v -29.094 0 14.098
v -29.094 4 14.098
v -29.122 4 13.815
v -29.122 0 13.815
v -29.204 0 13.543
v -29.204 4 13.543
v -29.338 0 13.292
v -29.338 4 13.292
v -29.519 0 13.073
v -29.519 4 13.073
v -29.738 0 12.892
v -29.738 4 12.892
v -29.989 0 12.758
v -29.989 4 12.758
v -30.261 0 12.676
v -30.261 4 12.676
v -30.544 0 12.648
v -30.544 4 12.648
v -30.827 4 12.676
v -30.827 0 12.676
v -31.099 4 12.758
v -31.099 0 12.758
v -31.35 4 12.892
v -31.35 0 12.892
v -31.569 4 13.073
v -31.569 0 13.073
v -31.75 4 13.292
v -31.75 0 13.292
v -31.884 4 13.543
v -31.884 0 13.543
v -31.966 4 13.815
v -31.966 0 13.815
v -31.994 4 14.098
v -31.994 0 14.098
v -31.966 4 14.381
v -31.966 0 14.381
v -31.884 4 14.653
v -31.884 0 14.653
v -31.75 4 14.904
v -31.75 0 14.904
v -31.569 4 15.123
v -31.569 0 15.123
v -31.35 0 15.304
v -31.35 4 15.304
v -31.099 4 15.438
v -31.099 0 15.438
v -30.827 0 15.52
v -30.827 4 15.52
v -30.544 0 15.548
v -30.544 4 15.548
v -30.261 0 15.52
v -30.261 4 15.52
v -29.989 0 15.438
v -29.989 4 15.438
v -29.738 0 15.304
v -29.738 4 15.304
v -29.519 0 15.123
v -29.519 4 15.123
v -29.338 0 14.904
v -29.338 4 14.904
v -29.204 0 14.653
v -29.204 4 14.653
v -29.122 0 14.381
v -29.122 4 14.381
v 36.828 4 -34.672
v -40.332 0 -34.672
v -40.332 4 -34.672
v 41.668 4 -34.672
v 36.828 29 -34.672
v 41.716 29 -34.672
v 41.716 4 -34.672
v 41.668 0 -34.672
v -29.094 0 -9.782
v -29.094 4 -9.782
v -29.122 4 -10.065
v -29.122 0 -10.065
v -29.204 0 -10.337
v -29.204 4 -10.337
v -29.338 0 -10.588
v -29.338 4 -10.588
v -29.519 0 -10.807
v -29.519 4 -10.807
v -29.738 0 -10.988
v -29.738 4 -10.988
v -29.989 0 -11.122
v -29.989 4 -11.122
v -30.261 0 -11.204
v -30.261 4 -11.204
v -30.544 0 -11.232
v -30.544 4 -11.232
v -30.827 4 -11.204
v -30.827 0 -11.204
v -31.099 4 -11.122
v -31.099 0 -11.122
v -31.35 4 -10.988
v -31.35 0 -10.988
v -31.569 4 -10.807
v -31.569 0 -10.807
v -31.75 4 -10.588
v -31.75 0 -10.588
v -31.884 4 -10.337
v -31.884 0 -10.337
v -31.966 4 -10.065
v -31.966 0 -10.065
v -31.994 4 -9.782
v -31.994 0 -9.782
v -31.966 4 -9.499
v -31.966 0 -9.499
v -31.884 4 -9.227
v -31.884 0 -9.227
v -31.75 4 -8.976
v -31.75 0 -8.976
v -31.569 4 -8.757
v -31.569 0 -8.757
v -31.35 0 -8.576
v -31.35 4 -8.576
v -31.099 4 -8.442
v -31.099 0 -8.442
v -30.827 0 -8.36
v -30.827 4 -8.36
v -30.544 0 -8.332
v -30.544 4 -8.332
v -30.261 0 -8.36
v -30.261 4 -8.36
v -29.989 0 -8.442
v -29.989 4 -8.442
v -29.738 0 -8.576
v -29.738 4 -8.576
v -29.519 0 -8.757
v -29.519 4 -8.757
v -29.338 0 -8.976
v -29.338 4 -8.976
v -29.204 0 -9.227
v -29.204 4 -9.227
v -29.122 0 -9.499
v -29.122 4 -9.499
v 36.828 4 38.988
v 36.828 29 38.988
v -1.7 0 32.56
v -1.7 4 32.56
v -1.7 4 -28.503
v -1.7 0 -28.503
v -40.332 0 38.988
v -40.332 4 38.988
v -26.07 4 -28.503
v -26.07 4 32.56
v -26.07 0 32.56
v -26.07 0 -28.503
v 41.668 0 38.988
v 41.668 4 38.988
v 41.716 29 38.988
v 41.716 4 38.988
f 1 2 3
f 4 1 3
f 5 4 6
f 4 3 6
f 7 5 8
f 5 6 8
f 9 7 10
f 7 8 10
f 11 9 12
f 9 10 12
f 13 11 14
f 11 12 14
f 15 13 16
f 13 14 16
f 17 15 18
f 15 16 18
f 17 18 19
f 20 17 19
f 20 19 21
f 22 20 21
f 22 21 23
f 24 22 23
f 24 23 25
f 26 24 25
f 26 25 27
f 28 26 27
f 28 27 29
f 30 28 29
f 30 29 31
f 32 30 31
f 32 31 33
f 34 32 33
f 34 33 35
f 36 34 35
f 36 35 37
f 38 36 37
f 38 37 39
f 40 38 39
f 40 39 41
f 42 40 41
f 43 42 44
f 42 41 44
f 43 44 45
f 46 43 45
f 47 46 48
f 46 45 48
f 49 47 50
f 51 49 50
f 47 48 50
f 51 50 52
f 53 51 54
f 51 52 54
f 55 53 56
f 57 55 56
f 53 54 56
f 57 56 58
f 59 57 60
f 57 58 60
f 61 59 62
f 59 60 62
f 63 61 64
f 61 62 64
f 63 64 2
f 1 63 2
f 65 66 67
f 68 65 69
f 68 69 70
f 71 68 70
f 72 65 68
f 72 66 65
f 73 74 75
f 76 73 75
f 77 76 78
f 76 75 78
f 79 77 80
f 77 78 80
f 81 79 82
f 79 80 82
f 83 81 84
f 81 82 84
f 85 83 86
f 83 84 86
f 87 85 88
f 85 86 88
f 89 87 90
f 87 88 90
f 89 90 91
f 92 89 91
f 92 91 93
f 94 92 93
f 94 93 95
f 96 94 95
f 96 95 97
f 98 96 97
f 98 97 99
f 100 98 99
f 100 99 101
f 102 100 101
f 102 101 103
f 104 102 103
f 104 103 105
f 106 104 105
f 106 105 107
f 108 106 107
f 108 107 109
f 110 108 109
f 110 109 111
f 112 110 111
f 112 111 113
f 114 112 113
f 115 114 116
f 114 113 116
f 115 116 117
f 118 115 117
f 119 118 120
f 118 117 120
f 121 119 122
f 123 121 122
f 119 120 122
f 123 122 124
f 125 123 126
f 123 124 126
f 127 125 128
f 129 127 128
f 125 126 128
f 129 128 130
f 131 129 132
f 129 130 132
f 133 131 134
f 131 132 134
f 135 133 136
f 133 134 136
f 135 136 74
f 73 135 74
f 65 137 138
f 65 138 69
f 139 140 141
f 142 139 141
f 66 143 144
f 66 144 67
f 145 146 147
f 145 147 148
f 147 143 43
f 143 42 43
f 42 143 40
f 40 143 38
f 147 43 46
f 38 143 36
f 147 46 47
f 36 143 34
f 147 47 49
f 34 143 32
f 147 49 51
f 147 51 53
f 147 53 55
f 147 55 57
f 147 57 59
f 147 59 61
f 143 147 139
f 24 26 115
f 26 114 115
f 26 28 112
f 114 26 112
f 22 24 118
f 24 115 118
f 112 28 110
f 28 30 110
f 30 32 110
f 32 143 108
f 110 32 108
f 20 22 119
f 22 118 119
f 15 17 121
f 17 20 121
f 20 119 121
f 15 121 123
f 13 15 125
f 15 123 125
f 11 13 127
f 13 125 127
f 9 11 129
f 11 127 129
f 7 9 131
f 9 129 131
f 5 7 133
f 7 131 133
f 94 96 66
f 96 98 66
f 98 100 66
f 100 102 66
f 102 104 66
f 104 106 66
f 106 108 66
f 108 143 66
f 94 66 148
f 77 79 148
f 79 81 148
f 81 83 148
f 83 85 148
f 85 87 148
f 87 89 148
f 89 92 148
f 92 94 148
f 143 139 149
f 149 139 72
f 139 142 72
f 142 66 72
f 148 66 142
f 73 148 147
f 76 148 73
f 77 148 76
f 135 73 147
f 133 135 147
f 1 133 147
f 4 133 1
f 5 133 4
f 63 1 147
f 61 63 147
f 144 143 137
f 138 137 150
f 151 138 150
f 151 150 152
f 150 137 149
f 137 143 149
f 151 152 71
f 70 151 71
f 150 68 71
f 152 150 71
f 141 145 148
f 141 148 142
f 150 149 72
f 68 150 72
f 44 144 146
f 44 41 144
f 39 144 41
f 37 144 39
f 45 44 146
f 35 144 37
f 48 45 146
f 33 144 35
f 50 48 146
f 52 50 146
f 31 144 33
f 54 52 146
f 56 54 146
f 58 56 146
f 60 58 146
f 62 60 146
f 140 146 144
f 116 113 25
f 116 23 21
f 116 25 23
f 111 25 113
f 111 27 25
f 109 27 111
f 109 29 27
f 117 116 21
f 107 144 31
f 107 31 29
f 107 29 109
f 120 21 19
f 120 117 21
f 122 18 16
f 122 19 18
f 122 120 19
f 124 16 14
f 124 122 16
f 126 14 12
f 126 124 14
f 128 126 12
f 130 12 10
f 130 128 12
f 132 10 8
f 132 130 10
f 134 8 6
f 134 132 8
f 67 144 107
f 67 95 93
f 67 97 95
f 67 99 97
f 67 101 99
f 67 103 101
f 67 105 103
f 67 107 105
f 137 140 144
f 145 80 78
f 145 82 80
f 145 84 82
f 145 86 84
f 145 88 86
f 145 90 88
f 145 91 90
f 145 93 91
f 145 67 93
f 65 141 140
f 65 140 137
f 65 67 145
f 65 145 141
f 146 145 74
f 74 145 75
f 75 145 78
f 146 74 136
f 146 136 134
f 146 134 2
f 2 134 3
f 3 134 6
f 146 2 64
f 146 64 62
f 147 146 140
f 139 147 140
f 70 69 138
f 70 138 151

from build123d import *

# Parameters (mm, degrees)
SKETCH1_W           = 82
SKETCH1_H           = 73.66
BOSS_EXTRUDE1_DEPTH = 4
SKETCH2_W           = 4.88717895
SKETCH2_H           = 73.66
BOSS_EXTRUDE2_DEPTH = 25
SKETCH3_R           = 1.45
CUT_EXTRUDE1_DEPTH  = 10
SKETCH4_W           = 24.37
SKETCH4_H           = 61.062715067
CUT_EXTRUDE2_DEPTH  = 10


with BuildPart() as part:
    # Sketch1 → Boss-Extrude1 (new body)
    with BuildSketch(Plane(origin=(0, 0, 0), x_dir=(1, 0, 0), z_dir=(0, 1, 0))):
        with Locations((0.667646454, -2.157941762)):
            Rectangle(SKETCH1_W, SKETCH1_H)
    extrude(amount=BOSS_EXTRUDE1_DEPTH)

    # Sketch2 → Boss-Extrude2 (add)
    with BuildSketch(Plane(origin=(0, 4, 0), x_dir=(1, 0, 0), z_dir=(0, 1, 0))):
        with Locations((39.271911138, -2.157941762)):
            Rectangle(SKETCH2_W, SKETCH2_H)
    extrude(amount=BOSS_EXTRUDE2_DEPTH)

    # Sketch3 → Cut-Extrude1 (cut)
    with BuildSketch(Plane(origin=(0, 4, 0), x_dir=(1, 0, 0), z_dir=(0, 1, 0))):
        with Locations((-30.544050148, 9.782058238)):
            Circle(SKETCH3_R)
        with Locations((-30.544050148, -14.097941762)):
            Circle(SKETCH3_R)
    extrude(amount=-CUT_EXTRUDE1_DEPTH, mode=Mode.SUBTRACT)

    # Sketch4 → Cut-Extrude2 (cut)
    with BuildSketch(Plane(origin=(0, 4, 0), x_dir=(1, 0, 0), z_dir=(0, 1, 0))):
        with Locations((-13.885112628, -2.028636366)):
            Rectangle(SKETCH4_W, SKETCH4_H)
    extrude(amount=-CUT_EXTRUDE2_DEPTH, mode=Mode.SUBTRACT)


solid = part.part
